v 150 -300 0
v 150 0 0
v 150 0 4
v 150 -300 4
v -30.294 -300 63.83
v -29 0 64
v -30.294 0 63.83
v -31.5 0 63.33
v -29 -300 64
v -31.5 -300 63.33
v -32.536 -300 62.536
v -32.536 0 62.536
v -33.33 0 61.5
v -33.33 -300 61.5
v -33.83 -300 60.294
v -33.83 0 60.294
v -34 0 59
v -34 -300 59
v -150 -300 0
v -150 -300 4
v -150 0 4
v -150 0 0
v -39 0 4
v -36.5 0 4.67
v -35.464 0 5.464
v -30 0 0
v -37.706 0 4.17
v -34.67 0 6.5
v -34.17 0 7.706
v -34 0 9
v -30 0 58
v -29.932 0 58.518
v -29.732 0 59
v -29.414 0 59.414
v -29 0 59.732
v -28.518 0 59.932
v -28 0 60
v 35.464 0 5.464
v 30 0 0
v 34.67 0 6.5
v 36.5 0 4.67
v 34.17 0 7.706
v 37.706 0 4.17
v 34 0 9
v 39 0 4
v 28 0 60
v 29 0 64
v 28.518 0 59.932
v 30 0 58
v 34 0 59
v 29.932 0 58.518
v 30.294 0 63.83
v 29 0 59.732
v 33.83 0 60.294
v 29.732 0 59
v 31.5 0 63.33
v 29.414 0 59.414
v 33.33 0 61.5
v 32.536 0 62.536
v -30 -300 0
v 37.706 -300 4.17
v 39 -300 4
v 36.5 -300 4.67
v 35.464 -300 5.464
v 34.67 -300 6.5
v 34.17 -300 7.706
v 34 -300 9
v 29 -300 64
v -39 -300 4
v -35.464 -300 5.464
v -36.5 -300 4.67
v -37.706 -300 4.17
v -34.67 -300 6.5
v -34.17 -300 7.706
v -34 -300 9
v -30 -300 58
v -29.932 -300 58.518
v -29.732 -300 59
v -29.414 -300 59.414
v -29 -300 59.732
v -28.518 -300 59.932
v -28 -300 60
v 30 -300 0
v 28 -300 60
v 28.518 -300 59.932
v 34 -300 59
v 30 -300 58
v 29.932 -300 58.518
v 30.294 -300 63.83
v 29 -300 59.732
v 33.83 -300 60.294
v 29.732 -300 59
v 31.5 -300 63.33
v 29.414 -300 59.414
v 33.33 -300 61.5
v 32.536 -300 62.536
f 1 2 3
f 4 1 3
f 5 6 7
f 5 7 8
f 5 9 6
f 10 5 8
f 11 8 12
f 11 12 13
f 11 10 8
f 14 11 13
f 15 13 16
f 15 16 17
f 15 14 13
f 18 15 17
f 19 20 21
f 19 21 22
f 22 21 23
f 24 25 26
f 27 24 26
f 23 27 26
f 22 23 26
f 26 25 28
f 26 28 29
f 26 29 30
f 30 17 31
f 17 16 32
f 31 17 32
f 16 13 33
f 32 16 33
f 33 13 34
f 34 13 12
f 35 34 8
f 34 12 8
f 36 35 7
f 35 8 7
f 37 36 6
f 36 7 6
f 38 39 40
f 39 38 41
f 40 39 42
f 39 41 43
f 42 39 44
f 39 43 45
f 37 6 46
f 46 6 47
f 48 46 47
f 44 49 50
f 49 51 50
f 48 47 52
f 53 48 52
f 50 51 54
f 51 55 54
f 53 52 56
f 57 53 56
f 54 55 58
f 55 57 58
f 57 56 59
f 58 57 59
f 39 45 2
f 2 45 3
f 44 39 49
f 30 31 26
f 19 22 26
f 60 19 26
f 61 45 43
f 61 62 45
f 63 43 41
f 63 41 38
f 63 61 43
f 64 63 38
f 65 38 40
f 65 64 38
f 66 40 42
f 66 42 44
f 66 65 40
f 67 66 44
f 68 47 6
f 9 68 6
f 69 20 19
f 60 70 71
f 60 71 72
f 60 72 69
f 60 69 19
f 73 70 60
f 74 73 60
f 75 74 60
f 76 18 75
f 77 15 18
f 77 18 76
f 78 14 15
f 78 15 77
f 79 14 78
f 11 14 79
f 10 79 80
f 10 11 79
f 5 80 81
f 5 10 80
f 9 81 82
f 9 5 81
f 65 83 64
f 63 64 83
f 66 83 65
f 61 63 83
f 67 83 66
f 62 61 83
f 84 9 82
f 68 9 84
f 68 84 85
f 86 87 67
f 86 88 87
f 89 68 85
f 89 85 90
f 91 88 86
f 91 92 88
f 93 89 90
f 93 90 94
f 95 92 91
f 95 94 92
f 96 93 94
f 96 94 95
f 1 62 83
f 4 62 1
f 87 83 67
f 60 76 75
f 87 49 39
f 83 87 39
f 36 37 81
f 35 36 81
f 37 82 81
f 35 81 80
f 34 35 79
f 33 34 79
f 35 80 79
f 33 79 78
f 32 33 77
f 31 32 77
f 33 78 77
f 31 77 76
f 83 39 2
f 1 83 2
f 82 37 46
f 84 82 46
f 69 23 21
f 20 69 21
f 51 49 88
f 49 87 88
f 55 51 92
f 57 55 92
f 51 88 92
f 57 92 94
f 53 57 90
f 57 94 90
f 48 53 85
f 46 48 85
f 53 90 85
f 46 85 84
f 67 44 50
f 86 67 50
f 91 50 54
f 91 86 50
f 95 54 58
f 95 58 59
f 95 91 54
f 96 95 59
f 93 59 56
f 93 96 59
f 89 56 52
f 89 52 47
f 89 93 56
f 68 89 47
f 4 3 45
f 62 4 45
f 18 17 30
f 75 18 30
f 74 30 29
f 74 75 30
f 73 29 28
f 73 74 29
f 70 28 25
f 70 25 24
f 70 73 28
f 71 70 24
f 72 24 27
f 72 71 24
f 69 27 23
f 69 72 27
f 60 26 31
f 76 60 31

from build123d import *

# Parameters (mm, degrees)
F1_DEPTH = 300
F2_R     = 5
F3_R     = 2


with BuildPart() as f1:
    # F0 (on Front) → F1 (new body)
    with BuildSketch(Plane.XZ):
        Polygon((-150, 4), (-150, 0), (-30, 0), (-30, 60), (0, 60), (30, 60), (30, 0), (150, 0), (150, 4), (34, 4), (34, 64), (0, 64), (-34, 64), (-34, 4), align=None)
    extrude(amount=F1_DEPTH)

    # F2
    f2_edges = [f1.edges().sort_by_distance(p)[0] for p in [
        (-34, -150, 4),
        (34, -150, 4),
        (34, -150, 64),
        (-34, -150, 64),
    ]]
    fillet(f2_edges, radius=F2_R)

    # F3
    f3_edges = [f1.edges().sort_by_distance(p)[0] for p in [
        (30, -150, 60),
        (-30, -150, 60),
    ]]
    fillet(f3_edges, radius=F3_R)


solid = f1.part
